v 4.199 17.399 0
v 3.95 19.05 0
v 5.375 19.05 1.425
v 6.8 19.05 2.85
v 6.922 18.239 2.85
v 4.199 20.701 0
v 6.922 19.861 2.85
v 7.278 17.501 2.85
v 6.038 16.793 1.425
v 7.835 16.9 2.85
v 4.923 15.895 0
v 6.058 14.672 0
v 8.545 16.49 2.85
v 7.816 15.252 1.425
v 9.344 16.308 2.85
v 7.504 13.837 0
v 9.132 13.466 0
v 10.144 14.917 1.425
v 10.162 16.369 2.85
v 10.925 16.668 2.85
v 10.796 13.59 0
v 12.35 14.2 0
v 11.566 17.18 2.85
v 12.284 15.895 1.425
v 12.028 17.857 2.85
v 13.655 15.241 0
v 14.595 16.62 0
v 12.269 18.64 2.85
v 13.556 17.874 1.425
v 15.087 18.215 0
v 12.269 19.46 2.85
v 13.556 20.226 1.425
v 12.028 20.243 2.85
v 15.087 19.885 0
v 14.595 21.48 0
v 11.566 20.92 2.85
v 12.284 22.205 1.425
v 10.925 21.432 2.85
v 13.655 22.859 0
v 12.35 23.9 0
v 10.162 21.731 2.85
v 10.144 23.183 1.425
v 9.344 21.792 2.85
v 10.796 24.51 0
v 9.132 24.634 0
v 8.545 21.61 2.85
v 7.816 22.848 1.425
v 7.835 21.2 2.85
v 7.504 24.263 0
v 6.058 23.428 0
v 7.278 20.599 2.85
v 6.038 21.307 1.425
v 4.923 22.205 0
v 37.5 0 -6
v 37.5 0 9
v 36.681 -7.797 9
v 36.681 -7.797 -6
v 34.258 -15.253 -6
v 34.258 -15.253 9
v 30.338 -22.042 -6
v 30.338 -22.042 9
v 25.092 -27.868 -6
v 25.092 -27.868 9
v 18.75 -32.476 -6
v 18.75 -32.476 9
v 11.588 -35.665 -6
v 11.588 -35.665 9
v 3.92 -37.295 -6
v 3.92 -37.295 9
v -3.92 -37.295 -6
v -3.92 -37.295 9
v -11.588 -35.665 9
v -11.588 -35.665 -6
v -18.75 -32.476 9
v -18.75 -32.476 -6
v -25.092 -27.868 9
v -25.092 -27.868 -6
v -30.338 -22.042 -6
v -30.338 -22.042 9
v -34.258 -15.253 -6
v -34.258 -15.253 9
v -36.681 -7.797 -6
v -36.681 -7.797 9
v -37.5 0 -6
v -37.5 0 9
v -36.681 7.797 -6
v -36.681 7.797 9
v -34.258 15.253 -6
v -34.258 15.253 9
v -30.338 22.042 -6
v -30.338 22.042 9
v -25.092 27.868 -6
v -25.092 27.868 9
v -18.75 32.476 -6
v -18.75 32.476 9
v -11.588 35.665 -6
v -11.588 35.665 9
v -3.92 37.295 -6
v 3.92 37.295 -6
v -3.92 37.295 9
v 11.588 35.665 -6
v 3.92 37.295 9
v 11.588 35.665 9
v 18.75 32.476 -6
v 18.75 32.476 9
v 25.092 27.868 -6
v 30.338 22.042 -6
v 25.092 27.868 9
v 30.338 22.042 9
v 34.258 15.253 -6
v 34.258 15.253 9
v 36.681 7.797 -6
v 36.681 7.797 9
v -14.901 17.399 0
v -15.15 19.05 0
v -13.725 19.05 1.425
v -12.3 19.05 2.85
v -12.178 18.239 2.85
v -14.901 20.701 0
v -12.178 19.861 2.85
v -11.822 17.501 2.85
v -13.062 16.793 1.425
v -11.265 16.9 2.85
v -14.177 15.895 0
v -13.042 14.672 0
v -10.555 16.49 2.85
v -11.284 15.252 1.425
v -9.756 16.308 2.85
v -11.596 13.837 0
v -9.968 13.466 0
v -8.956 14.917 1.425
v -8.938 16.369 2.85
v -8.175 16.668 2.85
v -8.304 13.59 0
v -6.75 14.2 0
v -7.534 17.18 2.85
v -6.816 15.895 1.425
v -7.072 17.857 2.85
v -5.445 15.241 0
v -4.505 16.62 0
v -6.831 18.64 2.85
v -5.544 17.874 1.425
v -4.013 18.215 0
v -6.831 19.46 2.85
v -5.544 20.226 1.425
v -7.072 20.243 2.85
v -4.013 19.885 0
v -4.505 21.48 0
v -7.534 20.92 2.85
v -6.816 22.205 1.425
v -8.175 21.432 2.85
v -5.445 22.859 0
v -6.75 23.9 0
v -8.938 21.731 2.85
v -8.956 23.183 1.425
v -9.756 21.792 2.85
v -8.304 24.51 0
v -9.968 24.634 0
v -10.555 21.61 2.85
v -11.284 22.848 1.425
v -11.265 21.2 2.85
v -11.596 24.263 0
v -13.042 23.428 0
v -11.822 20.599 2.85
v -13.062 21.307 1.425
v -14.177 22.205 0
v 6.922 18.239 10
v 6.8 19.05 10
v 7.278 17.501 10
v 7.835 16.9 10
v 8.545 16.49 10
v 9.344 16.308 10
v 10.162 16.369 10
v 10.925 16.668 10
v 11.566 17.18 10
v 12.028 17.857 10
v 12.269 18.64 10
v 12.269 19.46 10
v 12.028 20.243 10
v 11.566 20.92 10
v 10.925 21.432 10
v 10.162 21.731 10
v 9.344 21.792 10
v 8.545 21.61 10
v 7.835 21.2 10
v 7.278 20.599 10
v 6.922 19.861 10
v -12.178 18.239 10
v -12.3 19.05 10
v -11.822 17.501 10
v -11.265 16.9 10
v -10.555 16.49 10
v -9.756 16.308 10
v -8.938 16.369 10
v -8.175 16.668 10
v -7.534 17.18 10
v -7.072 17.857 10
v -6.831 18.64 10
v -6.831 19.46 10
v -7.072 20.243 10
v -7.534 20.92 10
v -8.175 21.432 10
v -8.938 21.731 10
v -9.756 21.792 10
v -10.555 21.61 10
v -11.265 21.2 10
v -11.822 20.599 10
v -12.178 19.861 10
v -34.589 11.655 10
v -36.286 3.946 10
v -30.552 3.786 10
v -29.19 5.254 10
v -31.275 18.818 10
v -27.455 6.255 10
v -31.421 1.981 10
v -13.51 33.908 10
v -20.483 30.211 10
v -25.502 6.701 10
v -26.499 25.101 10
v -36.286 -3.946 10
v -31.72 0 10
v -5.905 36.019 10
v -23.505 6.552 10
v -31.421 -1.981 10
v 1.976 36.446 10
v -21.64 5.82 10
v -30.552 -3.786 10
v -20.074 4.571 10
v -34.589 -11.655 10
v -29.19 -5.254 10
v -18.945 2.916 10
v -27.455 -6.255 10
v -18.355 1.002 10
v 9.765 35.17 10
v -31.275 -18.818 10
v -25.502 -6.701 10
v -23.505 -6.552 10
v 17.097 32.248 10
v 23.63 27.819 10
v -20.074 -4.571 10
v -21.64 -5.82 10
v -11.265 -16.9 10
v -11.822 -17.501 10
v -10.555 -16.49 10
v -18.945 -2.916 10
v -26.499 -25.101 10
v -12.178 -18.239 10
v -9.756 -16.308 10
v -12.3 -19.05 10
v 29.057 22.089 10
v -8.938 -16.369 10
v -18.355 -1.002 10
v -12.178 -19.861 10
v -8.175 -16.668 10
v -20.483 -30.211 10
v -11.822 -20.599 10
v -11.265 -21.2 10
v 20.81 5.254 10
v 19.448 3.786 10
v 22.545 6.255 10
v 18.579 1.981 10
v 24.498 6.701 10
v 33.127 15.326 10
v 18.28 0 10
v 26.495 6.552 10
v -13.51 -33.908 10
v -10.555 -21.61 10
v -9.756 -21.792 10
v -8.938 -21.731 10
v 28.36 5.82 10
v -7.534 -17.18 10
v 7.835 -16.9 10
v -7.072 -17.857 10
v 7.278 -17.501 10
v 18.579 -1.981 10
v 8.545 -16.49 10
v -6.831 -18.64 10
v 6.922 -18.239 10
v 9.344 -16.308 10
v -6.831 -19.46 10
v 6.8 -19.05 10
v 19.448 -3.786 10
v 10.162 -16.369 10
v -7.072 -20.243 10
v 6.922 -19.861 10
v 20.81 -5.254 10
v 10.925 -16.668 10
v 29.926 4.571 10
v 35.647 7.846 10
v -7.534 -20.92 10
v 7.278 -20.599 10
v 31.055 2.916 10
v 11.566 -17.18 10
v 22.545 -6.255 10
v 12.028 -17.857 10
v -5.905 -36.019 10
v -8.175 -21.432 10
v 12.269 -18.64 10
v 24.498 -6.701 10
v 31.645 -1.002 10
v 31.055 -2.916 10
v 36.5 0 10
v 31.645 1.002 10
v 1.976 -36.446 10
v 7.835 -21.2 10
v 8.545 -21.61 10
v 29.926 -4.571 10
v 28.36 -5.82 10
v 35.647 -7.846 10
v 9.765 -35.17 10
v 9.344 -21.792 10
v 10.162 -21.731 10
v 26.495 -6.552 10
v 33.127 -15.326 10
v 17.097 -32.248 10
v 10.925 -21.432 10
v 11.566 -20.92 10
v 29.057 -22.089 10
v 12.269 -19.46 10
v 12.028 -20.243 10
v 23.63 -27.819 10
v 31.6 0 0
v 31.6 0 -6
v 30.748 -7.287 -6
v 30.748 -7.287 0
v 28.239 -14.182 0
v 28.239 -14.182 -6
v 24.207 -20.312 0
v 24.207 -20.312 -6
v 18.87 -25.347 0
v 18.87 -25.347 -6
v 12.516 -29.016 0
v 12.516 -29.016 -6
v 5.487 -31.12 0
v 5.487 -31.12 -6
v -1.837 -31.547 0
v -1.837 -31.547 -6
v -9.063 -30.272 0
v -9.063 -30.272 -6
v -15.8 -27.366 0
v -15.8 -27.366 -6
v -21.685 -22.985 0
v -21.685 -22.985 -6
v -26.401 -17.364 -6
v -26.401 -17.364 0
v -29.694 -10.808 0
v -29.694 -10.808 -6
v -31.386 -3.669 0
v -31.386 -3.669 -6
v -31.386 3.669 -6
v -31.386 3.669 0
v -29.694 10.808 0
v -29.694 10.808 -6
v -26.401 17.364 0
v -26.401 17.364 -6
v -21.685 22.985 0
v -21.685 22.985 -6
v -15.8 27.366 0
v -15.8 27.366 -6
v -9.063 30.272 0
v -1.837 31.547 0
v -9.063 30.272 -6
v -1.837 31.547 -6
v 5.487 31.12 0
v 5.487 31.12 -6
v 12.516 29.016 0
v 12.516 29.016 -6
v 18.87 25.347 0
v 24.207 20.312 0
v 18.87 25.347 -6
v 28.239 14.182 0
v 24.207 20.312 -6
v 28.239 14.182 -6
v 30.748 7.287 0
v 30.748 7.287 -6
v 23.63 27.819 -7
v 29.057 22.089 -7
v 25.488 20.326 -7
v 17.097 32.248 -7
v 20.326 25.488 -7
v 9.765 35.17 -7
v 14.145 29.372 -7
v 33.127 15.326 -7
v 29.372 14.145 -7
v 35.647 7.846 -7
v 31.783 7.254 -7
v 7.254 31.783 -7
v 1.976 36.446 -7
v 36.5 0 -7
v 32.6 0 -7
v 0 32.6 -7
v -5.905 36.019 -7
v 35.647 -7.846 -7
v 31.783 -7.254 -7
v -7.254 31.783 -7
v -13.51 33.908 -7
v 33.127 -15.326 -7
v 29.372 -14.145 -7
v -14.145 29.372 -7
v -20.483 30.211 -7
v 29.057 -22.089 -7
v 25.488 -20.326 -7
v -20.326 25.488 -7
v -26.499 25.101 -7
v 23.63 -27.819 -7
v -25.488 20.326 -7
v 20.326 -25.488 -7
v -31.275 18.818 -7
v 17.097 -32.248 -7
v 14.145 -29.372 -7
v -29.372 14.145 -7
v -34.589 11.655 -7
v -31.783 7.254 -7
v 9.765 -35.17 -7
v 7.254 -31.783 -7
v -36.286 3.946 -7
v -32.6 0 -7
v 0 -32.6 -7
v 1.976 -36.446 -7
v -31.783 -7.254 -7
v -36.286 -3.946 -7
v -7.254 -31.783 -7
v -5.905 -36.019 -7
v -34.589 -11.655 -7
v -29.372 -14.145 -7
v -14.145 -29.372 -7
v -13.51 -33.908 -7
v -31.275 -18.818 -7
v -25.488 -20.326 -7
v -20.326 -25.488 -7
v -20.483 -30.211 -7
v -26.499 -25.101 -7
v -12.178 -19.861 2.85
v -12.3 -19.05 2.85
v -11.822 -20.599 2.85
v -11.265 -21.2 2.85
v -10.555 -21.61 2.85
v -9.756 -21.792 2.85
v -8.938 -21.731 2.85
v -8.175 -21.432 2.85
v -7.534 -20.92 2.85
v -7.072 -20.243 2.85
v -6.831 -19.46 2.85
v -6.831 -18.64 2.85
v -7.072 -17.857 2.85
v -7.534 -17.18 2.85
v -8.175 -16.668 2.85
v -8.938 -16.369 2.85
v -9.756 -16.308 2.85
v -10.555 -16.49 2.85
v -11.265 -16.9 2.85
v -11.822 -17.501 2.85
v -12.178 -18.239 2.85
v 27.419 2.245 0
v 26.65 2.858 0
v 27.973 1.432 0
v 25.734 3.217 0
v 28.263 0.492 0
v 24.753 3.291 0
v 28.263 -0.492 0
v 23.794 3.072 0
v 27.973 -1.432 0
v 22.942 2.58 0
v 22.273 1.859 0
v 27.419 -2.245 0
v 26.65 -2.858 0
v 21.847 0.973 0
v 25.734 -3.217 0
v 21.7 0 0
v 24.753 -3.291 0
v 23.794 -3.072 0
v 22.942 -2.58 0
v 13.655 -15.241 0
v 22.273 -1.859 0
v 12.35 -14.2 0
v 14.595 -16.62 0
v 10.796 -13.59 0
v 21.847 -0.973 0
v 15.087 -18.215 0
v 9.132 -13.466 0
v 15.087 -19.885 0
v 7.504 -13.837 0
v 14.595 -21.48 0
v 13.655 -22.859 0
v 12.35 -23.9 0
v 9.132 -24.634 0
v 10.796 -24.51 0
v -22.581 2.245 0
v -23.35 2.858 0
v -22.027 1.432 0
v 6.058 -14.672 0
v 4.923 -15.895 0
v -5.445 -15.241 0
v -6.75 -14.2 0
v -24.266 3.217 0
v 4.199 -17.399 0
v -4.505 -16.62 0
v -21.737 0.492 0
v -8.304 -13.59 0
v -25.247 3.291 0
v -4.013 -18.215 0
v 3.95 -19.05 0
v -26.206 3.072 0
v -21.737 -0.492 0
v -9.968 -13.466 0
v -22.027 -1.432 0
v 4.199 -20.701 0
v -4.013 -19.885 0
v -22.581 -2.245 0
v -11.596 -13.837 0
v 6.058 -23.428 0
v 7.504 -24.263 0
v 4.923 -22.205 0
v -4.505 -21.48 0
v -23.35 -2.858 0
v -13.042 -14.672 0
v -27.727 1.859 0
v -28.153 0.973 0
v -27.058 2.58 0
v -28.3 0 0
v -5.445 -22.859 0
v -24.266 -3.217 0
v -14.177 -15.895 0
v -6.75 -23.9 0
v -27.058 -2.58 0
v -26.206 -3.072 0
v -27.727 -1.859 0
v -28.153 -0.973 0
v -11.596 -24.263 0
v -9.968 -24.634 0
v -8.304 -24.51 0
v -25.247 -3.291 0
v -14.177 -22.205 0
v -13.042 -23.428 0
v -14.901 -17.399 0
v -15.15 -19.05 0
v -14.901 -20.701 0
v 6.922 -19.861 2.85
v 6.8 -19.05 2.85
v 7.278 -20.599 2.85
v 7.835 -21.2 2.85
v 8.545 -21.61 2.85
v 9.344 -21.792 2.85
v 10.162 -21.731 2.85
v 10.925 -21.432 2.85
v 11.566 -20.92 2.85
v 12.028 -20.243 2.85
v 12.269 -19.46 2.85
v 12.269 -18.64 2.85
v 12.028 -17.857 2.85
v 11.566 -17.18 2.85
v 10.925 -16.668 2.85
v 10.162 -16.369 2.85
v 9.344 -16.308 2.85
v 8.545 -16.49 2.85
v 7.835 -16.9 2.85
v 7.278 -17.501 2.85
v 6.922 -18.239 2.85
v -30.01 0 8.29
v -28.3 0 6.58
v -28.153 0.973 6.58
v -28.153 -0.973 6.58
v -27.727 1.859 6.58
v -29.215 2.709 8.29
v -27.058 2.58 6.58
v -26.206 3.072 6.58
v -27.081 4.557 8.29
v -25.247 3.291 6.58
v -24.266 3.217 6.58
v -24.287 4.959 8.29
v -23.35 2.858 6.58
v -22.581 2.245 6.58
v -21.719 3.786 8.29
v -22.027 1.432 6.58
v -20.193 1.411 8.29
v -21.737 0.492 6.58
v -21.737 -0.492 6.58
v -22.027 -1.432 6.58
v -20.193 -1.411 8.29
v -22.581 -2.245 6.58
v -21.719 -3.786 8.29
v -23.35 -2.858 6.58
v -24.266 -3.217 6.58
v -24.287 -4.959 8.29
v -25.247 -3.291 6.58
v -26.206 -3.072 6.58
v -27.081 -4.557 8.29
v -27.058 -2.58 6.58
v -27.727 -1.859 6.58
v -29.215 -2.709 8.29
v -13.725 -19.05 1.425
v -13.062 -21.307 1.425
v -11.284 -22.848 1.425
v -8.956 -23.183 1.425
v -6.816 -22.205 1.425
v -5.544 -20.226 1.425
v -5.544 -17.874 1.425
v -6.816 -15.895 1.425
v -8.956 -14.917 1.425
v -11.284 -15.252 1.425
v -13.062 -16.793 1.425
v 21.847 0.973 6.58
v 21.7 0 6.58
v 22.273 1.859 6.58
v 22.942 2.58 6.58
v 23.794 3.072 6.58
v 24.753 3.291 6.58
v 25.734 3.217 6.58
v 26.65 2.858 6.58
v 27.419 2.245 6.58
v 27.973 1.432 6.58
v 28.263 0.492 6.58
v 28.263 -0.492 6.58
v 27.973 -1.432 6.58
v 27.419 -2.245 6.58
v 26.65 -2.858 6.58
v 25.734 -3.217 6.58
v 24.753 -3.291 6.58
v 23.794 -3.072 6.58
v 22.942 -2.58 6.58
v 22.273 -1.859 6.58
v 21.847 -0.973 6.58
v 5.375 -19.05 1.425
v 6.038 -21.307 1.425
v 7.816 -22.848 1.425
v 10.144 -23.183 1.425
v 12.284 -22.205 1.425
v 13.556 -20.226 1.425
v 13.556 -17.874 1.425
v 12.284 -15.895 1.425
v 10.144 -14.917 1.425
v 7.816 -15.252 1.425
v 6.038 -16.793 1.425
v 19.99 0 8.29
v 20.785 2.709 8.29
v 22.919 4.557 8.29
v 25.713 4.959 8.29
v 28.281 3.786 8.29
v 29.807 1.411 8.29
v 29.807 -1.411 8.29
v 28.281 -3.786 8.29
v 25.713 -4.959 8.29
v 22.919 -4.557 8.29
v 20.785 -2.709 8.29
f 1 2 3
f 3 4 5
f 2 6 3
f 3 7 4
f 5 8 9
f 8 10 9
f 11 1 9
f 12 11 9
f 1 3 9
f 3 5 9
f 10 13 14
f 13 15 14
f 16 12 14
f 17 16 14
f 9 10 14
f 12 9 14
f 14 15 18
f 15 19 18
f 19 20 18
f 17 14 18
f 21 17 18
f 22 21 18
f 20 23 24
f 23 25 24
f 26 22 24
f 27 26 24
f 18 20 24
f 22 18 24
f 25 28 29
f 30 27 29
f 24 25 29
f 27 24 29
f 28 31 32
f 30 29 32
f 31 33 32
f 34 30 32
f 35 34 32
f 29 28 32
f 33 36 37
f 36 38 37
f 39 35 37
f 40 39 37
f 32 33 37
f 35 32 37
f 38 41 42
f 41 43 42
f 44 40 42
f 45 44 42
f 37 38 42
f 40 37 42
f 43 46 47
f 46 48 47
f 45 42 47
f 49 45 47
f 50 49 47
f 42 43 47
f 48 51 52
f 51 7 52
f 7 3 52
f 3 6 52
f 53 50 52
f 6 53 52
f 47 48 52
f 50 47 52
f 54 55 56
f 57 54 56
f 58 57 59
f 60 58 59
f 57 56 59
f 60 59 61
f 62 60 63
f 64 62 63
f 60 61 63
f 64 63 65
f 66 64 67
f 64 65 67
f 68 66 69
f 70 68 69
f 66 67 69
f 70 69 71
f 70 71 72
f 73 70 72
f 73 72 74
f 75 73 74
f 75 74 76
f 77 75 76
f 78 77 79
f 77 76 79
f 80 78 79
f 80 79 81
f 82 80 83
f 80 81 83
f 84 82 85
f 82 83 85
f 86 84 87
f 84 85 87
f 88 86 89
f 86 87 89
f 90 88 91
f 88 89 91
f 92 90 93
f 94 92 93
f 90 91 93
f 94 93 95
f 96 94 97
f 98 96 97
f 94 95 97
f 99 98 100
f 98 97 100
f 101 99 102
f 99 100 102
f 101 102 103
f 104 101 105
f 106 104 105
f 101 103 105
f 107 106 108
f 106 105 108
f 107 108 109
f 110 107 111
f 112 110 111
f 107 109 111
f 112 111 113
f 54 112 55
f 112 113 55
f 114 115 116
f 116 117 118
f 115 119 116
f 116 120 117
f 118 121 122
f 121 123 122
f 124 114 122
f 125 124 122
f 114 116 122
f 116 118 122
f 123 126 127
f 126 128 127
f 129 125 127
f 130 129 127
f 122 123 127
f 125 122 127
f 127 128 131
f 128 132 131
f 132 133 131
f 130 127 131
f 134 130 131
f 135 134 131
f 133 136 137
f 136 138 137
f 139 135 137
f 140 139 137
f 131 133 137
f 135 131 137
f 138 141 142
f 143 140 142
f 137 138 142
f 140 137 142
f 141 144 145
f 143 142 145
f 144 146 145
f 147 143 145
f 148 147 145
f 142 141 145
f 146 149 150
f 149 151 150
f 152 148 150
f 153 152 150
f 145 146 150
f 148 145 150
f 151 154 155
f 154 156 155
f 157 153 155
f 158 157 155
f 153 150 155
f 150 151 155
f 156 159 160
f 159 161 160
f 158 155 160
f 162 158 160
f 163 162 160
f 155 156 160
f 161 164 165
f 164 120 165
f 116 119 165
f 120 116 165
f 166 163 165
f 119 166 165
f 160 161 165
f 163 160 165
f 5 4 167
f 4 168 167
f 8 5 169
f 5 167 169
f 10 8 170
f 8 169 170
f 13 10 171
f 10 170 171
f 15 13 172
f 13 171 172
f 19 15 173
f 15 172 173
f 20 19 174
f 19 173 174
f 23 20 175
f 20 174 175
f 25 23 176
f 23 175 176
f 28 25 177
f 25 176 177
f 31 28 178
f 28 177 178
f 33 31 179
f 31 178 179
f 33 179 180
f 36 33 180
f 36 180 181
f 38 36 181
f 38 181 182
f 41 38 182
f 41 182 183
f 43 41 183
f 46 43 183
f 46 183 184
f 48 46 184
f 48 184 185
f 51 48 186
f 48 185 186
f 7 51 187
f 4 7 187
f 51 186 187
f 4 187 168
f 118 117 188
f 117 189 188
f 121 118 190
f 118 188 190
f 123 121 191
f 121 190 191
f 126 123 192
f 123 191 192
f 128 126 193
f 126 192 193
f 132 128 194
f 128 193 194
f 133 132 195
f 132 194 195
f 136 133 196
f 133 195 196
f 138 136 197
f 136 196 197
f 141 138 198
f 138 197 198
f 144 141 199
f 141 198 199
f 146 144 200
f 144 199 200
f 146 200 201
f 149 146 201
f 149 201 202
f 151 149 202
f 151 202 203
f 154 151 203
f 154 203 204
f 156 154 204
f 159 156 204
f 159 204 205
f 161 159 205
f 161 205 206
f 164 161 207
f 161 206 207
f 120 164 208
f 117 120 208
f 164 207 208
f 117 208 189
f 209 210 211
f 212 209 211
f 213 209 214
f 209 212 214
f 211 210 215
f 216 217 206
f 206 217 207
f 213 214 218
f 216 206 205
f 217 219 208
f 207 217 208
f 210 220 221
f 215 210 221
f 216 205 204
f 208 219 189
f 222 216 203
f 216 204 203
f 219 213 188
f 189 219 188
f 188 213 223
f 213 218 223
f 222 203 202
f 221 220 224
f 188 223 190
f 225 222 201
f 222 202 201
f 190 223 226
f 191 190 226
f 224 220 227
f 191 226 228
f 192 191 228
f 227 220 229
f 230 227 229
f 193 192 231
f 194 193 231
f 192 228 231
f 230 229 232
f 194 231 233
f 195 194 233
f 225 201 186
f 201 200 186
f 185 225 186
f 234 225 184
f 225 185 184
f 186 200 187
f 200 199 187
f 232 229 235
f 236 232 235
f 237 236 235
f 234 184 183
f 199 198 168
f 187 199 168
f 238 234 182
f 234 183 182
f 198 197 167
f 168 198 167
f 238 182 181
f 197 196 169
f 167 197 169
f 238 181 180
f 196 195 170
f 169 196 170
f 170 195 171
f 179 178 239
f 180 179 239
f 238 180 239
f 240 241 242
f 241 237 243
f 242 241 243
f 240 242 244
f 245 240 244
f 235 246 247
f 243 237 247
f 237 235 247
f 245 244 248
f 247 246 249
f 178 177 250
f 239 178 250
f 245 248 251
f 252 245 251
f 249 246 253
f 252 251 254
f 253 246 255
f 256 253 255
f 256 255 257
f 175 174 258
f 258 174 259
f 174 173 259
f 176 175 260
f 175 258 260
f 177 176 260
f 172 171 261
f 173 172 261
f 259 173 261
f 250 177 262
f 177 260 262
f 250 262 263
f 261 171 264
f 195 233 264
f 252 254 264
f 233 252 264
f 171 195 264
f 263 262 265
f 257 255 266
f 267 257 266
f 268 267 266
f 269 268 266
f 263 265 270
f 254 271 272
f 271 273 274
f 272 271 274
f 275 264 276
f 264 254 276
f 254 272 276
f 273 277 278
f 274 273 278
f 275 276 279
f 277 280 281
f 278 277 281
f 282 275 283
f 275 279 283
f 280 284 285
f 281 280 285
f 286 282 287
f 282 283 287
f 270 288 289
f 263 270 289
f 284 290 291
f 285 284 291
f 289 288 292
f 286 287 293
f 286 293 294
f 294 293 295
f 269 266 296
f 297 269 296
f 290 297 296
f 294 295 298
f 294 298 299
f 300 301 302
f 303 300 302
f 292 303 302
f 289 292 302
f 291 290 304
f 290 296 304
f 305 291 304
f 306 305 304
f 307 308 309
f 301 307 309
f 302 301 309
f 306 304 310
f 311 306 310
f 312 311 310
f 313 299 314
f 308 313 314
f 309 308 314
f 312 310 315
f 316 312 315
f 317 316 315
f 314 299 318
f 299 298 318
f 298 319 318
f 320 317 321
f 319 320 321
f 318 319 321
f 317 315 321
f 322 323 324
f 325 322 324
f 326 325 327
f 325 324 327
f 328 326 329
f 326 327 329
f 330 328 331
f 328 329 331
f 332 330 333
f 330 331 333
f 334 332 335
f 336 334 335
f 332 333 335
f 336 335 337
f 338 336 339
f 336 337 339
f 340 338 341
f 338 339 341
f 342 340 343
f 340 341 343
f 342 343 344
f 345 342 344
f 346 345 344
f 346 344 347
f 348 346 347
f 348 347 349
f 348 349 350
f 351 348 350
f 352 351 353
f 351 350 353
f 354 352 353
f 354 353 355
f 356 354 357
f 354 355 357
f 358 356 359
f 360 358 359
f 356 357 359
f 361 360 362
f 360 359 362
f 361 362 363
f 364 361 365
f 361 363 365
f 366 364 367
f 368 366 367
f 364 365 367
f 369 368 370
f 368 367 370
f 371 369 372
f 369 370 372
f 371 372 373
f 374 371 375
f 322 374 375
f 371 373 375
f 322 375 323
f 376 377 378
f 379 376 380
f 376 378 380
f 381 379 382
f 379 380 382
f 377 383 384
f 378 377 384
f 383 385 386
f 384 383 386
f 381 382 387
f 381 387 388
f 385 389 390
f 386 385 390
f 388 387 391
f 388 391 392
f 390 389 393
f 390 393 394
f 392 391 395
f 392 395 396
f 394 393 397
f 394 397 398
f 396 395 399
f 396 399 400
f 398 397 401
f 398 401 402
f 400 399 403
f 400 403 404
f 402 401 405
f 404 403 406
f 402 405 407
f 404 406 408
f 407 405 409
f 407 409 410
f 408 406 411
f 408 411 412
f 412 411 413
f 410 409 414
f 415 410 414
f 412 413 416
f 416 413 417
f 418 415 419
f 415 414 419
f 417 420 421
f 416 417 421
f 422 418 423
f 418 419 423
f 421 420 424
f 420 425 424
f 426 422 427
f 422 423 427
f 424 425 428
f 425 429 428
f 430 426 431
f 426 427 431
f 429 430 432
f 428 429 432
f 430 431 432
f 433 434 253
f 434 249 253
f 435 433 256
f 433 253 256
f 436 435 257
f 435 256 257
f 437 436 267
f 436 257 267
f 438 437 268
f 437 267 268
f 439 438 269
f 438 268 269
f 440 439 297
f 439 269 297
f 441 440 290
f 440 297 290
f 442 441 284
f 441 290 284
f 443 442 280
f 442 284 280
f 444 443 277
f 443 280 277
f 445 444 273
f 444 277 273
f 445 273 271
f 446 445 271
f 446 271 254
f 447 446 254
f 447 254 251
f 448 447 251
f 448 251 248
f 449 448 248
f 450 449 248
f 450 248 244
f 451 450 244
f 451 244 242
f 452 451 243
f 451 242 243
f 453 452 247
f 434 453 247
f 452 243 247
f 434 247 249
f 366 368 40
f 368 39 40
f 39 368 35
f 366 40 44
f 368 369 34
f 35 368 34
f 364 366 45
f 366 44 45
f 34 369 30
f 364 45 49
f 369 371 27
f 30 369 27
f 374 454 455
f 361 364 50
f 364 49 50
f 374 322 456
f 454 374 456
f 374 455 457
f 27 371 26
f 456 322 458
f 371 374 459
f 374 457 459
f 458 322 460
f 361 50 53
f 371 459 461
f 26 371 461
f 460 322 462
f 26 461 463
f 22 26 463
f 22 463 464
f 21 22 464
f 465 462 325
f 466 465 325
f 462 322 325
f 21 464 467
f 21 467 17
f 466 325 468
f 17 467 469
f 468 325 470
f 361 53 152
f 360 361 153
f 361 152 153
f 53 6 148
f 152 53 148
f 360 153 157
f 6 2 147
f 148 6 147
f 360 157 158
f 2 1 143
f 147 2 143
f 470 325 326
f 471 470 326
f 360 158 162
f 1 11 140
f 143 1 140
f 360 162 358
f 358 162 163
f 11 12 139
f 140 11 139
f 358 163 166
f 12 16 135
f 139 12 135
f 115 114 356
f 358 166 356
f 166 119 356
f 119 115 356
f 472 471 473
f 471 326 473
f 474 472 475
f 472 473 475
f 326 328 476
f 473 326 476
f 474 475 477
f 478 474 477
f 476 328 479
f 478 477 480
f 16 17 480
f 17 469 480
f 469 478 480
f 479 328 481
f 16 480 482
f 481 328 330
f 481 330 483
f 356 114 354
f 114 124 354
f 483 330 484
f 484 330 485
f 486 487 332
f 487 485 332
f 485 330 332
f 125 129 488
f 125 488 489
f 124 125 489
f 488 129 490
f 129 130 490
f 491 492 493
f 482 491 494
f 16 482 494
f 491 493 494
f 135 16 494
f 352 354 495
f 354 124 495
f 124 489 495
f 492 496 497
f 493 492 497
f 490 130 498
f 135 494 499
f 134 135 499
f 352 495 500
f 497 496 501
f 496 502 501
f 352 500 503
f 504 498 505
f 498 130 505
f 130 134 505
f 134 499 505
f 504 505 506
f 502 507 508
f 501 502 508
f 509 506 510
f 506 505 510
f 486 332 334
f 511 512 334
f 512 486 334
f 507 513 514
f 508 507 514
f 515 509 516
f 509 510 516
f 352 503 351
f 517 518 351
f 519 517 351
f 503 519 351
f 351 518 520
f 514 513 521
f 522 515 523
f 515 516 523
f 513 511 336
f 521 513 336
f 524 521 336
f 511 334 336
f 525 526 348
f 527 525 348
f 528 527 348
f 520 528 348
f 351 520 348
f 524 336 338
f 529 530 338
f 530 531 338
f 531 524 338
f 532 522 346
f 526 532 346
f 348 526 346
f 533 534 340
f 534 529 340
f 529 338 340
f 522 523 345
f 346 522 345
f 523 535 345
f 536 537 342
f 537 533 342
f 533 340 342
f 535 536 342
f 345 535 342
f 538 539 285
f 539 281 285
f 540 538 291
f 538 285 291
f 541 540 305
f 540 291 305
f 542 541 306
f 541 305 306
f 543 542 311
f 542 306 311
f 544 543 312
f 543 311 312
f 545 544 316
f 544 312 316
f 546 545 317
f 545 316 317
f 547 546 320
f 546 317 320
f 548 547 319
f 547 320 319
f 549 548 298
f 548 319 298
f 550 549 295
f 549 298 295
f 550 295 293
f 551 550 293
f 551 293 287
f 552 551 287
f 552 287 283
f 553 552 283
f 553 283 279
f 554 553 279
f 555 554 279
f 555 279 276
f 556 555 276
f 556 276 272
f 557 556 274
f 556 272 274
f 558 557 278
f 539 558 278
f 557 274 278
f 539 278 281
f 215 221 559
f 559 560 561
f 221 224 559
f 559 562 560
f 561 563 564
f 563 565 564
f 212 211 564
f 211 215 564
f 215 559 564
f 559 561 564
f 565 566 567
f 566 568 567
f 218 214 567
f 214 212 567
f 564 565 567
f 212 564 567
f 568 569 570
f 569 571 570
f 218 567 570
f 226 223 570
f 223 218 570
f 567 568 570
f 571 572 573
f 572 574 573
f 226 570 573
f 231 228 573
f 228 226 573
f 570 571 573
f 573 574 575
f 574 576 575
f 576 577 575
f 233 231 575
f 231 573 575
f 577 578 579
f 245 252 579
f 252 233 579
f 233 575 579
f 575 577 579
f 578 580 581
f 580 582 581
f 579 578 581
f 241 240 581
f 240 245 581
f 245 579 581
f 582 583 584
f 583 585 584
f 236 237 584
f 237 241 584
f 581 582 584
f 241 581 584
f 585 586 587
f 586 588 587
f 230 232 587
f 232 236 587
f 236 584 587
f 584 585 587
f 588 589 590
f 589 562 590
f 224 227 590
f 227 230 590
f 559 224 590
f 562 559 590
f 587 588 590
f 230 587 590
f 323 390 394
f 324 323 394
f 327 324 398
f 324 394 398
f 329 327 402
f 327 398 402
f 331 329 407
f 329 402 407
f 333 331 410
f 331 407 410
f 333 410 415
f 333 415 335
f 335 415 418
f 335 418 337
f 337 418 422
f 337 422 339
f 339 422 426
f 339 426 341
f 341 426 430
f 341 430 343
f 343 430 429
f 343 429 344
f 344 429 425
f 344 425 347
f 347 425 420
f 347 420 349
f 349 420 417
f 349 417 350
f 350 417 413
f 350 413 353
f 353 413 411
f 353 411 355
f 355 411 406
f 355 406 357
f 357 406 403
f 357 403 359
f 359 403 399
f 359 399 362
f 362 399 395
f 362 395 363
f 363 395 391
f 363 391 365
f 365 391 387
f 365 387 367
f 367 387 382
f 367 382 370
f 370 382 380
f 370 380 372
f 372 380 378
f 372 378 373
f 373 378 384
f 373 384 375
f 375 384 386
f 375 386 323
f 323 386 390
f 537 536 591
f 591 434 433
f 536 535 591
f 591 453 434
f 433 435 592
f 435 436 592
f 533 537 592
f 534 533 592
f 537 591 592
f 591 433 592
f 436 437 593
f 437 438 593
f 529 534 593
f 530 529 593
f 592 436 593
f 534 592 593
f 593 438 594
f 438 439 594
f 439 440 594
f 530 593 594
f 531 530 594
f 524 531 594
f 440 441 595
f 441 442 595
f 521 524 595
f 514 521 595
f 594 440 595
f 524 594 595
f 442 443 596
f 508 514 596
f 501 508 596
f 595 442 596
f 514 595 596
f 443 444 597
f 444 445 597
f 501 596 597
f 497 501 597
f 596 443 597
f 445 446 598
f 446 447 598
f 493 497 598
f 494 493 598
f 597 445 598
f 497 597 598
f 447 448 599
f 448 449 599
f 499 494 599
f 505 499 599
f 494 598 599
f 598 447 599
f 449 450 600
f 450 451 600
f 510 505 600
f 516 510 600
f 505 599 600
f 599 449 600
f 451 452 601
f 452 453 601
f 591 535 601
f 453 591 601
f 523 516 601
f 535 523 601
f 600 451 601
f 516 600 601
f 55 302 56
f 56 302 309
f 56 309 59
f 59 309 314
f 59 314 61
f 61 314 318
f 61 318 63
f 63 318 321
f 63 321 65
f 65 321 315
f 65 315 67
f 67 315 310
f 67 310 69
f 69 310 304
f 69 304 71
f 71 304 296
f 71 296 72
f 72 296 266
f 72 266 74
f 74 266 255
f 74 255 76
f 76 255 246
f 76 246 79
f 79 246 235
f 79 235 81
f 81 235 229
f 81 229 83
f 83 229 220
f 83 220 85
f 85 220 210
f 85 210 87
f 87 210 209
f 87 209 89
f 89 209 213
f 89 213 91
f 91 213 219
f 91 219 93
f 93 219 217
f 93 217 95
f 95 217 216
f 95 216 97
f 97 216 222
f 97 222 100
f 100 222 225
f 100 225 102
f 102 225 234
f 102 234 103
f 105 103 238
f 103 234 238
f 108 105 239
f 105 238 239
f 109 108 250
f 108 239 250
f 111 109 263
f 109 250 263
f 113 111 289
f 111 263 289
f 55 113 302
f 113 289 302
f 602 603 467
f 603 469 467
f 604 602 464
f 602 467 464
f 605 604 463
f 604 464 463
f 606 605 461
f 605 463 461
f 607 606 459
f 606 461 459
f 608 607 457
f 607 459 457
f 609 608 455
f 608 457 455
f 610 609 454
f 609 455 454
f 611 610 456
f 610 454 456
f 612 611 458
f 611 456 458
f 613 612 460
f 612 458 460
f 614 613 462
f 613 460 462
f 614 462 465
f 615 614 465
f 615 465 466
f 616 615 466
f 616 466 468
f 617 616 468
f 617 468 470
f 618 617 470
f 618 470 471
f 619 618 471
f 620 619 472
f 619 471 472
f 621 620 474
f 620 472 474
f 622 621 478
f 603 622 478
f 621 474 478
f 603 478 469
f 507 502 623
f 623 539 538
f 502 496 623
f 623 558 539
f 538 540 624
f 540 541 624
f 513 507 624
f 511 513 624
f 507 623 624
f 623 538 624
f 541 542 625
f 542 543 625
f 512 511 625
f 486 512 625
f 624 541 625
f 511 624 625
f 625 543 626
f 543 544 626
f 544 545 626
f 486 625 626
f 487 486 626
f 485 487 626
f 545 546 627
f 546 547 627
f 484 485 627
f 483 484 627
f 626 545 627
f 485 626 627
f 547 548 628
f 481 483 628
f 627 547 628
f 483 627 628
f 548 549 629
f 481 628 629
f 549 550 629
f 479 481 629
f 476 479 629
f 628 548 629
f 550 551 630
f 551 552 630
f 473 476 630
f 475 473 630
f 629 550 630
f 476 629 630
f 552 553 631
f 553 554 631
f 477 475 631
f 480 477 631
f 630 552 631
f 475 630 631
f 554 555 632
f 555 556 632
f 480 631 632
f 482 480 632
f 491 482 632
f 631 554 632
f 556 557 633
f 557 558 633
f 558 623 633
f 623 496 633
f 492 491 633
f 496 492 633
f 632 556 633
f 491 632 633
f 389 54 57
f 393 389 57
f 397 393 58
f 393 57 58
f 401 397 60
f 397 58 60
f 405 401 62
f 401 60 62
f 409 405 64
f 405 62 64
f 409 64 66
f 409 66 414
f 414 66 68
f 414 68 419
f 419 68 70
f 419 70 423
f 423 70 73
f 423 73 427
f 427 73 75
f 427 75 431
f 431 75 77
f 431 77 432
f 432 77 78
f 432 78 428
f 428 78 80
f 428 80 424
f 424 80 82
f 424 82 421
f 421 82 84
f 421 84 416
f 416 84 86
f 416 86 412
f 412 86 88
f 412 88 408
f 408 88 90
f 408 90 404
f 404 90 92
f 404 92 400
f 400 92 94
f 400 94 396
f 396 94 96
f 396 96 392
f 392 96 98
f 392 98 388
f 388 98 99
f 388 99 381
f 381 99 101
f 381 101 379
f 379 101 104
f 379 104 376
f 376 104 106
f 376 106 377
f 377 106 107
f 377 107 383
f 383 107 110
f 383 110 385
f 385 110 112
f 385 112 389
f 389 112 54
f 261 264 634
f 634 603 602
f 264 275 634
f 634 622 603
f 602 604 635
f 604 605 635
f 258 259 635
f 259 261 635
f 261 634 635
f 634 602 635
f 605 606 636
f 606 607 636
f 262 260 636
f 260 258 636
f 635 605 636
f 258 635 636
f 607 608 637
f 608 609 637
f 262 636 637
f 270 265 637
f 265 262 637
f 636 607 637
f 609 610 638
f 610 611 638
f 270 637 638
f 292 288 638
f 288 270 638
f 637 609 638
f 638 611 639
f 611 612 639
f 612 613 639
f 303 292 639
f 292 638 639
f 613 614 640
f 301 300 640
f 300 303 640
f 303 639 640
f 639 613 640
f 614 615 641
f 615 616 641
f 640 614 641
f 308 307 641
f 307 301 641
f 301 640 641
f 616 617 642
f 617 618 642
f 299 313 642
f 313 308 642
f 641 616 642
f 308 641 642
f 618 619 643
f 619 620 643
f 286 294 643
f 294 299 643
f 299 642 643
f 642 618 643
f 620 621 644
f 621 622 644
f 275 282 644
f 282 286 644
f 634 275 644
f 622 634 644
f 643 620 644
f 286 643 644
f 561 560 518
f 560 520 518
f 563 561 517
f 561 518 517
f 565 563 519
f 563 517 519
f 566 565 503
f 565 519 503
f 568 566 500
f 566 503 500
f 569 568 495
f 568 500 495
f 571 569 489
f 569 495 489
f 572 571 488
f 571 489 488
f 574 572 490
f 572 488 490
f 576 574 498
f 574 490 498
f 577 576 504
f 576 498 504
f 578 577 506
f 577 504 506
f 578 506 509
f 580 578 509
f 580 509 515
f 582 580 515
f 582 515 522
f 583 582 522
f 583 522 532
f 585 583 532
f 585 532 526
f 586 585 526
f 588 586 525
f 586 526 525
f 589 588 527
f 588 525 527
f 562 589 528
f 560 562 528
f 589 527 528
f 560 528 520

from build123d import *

# Parameters (mm, degrees)
F2_SIZE        = 1
F4_D           = 6.6
F4_CSINK_D     = 13.44
F4_CSINK_ANGLE = 90
F6_D           = 5.5
F6_CSINK_D     = 11.2
F6_CSINK_ANGLE = 90


with BuildPart() as f1:
    # F0 (on Front) → F1 (revolve)
    with BuildSketch(Plane.XZ):
        Polygon((0, 10), (0, 0), (31.6, 0), (31.6, -7), (37.5, -7), (37.5, 10), align=None)
    revolve(axis=Axis((0, 0, 5), (0, 0, -1)))

    # F2
    f2_edges = [f1.edges().sort_by_distance(p)[0] for p in [
        (-31.6, 0, -7),
        (-37.5, 0, -7),
        (-37.5, 0, 10),
    ]]
    chamfer(f2_edges, length=F2_SIZE)

    # F4 (through all)
    with Locations(Plane.XY.offset(10)):
        with Locations((-25, 0), (25, 0)):
            CounterSinkHole(F4_D / 2, F4_CSINK_D / 2, counter_sink_angle=F4_CSINK_ANGLE)

    # F6 (through all)
    with Locations(Plane(origin=(0, 0, 0), x_dir=(1, 0, 0), z_dir=(0, 0, -1))):
        with Locations((-9.55, 19.05), (9.55, 19.05), (9.55, -19.05), (-9.55, -19.05)):
            CounterSinkHole(F6_D / 2, F6_CSINK_D / 2, counter_sink_angle=F6_CSINK_ANGLE)


solid = f1.part
